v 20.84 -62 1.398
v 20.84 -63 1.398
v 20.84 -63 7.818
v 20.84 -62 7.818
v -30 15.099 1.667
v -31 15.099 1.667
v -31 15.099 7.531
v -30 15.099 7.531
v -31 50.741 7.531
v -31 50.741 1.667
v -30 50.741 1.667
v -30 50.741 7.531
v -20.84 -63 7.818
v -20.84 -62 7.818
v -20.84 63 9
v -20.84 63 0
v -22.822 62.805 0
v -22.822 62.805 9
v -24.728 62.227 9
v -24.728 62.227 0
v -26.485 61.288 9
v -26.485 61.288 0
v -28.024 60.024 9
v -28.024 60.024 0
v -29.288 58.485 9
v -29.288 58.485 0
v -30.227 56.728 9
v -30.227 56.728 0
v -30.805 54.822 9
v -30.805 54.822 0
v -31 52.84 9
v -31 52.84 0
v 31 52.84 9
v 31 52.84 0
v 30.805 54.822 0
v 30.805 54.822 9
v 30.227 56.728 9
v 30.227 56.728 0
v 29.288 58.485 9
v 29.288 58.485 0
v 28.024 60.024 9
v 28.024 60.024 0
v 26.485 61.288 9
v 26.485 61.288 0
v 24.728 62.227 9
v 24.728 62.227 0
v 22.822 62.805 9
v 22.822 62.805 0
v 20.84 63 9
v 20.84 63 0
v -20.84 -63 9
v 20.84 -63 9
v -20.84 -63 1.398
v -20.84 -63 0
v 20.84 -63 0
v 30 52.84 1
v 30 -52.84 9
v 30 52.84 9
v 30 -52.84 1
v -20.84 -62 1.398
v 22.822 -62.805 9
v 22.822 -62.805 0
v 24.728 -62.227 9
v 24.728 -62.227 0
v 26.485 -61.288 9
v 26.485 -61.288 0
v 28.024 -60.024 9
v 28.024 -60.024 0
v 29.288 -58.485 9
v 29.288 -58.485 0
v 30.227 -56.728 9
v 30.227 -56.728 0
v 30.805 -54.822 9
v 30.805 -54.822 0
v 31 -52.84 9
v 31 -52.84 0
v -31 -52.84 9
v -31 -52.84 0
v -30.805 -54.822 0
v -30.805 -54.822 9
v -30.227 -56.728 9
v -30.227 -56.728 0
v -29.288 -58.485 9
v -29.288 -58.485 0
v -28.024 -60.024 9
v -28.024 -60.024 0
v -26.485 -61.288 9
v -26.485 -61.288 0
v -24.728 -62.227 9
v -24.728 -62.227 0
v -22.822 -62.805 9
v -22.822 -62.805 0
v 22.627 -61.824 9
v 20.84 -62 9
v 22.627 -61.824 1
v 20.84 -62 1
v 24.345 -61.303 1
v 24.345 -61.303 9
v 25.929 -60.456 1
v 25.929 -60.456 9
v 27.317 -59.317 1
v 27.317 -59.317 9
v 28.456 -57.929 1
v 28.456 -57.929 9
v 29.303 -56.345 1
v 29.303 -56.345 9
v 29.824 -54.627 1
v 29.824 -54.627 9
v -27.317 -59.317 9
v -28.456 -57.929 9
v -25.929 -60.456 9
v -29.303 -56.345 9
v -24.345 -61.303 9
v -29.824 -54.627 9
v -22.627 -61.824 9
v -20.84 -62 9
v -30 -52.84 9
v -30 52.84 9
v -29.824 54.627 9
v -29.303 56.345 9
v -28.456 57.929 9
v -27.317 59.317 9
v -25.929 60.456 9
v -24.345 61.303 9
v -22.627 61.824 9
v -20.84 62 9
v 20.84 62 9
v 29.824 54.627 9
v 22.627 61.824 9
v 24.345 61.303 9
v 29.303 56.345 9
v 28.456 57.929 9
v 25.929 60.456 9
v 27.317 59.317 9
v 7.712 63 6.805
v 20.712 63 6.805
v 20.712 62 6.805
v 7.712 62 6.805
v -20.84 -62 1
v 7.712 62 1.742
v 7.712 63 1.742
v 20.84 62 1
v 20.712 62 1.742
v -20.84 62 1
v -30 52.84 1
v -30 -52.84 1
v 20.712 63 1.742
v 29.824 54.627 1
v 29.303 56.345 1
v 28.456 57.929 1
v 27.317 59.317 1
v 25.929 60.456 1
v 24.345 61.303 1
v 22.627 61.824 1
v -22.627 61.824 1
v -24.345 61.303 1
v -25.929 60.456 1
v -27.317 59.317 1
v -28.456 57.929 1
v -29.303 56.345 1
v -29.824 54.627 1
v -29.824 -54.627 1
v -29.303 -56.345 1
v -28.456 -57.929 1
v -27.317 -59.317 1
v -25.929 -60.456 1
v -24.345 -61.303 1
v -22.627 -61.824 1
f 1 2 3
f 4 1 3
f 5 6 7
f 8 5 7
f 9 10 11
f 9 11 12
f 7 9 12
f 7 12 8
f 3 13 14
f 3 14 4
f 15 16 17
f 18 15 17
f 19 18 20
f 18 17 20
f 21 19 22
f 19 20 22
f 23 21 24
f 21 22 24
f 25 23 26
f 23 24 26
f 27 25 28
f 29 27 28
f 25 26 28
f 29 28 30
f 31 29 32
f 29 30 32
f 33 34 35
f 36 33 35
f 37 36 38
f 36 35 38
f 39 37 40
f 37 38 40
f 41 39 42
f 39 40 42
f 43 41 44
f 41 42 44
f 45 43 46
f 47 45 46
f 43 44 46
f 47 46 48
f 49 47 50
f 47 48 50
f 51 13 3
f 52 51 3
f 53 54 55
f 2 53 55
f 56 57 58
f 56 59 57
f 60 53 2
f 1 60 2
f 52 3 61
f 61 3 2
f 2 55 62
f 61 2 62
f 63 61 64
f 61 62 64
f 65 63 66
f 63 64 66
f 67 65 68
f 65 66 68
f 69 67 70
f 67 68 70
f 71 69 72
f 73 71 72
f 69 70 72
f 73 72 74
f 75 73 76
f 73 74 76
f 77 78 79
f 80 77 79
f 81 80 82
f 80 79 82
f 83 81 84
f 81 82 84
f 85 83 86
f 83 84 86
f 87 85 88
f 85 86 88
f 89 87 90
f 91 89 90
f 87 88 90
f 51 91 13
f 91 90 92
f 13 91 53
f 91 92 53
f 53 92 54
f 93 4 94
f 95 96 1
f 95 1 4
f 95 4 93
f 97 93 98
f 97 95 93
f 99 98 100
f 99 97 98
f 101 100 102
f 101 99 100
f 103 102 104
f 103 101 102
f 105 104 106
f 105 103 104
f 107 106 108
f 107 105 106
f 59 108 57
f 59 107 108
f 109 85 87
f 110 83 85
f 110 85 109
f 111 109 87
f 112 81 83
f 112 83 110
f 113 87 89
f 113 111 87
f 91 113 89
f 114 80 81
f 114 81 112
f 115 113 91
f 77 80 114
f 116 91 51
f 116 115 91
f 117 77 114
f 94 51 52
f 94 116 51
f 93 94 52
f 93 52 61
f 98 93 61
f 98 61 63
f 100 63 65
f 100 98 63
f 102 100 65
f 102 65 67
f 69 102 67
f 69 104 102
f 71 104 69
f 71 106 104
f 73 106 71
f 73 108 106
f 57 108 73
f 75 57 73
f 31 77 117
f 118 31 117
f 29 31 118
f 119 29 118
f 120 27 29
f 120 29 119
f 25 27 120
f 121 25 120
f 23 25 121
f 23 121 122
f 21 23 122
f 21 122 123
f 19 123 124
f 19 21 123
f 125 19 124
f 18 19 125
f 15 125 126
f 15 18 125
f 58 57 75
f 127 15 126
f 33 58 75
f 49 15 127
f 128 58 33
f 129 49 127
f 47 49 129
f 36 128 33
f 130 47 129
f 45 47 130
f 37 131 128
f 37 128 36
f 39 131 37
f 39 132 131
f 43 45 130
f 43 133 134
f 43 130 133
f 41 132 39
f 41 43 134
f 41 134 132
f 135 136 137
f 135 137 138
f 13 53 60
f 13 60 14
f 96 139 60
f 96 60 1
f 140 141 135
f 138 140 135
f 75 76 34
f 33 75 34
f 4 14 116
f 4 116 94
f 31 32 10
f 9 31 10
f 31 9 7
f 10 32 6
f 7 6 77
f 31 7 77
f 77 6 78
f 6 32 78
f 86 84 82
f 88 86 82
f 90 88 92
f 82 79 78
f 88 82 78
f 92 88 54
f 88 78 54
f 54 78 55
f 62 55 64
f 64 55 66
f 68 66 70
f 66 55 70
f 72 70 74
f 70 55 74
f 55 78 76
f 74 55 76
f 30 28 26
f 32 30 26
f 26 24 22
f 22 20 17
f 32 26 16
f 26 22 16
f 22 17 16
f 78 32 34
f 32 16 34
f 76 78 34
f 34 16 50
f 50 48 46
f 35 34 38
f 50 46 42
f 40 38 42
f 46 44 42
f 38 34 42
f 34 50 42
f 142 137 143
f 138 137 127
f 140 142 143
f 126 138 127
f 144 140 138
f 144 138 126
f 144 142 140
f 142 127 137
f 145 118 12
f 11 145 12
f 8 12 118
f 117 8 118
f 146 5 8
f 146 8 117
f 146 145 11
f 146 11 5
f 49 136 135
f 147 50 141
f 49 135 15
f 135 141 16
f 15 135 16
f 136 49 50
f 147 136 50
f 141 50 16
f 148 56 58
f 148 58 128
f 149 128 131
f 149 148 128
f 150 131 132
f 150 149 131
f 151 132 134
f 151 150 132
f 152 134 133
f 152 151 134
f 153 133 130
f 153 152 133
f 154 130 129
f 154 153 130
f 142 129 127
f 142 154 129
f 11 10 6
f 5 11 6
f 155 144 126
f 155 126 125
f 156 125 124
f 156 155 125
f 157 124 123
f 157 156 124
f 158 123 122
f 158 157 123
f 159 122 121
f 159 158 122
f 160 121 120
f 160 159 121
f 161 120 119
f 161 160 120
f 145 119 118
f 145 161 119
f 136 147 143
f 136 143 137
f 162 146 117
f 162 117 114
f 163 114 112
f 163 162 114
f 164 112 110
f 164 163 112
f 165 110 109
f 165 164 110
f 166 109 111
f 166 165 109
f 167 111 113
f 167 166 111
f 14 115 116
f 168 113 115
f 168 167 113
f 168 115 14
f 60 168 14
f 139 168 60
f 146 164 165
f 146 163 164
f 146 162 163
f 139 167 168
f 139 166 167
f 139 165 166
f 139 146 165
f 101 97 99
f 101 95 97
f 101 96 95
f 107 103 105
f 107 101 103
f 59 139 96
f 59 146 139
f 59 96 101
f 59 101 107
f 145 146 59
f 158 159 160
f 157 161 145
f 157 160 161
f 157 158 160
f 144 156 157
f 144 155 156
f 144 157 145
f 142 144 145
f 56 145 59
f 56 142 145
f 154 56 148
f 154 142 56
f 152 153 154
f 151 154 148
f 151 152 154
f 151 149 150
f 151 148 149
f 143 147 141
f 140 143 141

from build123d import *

# Parameters (mm, degrees)
F1_DEPTH = 9
F2_T     = -1
F3_W     = 13
F3_H     = 5.063144
F4_DEPTH = 8.9
F5_W     = 35.64187
F5_H     = 5.863439
F6_DEPTH = 9.9
F7_W     = 41.68
F7_H     = 6.419253
F8_DEPTH = 25


with BuildPart() as f1:
    # F0 (on Top) → F1 (new body)
    with BuildSketch(Plane.XY):
        with BuildLine():
            ThreePointArc((31, 52.84), (28.024205, 60.024205), (20.84, 63))
            Line((20.84, 63), (-20.84, 63))
            ThreePointArc((-20.84, 63), (-28.024205, 60.024205), (-31, 52.84))
            Line((-31, 52.84), (-31, -52.84))
            ThreePointArc((-31, -52.84), (-28.024205, -60.024205), (-20.84, -63))
            Line((-20.84, -63), (20.84, -63))
            ThreePointArc((20.84, -63), (28.024205, -60.024205), (31, -52.84))
            Line((31, -52.84), (31, 52.84))
        make_face()
    extrude(amount=F1_DEPTH)

    # F2
    f2_openings = [f1.faces().sort_by_distance(p)[0] for p in [
        (0, 0, 9),
    ]]
    offset(amount=F2_T, openings=f2_openings)

    # F3 (on face) → F4 (cut)
    with BuildSketch(Plane(origin=(0, 63, 0), x_dir=(-1, 0, 0), z_dir=(0, 1, 0))):
        with Locations((-14.212146, 4.273678)):
            Rectangle(F3_W, F3_H)
    extrude(amount=-F4_DEPTH, mode=Mode.SUBTRACT)

    # F5 (on face) → F6 (cut)
    with BuildSketch(Plane(origin=(-31, 0, 0), x_dir=(0, -1, 0), z_dir=(-1, 0, 0))):
        with Locations((-32.919836, 4.599208)):
            Rectangle(F5_W, F5_H)
    extrude(amount=-F6_DEPTH, mode=Mode.SUBTRACT)

    # F7 (on face) → F8 (cut)
    with BuildSketch(Plane.XZ.offset(63)):
        with Locations((0, 4.608059)):
            Rectangle(F7_W, F7_H)
    extrude(amount=-F8_DEPTH, mode=Mode.SUBTRACT)


solid = f1.part
